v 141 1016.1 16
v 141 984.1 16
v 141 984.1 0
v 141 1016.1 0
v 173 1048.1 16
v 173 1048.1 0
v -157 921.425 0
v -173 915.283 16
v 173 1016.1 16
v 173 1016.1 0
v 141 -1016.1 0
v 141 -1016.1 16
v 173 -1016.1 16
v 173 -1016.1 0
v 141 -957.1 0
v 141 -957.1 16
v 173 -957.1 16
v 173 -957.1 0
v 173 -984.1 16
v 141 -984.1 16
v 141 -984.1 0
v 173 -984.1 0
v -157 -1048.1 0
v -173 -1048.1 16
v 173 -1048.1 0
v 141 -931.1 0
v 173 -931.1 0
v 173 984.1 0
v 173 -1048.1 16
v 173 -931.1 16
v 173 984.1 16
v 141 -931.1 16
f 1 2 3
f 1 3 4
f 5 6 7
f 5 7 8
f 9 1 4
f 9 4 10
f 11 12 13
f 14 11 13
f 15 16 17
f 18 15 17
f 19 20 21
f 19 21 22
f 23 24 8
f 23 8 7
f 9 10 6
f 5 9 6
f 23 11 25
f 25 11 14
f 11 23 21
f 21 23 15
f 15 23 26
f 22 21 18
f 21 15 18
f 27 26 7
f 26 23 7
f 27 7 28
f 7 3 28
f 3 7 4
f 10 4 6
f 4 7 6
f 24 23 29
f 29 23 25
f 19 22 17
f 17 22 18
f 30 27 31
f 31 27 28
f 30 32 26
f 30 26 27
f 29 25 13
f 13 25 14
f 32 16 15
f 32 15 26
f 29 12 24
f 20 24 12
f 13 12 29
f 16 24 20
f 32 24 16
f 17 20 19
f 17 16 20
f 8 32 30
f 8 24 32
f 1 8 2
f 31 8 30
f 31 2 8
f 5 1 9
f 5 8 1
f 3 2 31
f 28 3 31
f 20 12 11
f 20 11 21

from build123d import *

# Parameters (mm, degrees)
BOSS_EXTRUDE1_DEPTH = 16
CUT_EXTRUDE2_DEPTH  = 2104.387610499
SKETCH6_W           = 32
SKETCH6_H           = 32
SKETCH6_H_2         = 26
CUT_EXTRUDE4_DEPTH  = 1063.402282565


with BuildPart() as part:
    # Sketch1 → Boss-Extrude1 (new body)
    with BuildSketch(Plane.XY):
        Polygon((173, 1048.1), (-173, 915.283043878), (-173, -1048.1), (173, -1048.1), align=None)
    extrude(amount=BOSS_EXTRUDE1_DEPTH)

    # Sketch3 → Cut-Extrude2 (cut, through all)
    with BuildSketch(Plane.XZ.offset(1048.1)):
        Polygon((-173, 16), (-157, 0), (-173, 0), align=None)
    extrude(amount=-CUT_EXTRUDE2_DEPTH, mode=Mode.SUBTRACT)

    # Sketch6 → Cut-Extrude4 (cut, through all)
    with BuildSketch(Plane.XY.offset(16)):
        with Locations((157, 1000.1)):
            Rectangle(SKETCH6_W, SKETCH6_H)
        with Locations((157, -1000.1)):
            Rectangle(SKETCH6_W, SKETCH6_H)
        with Locations((157, -944.1)):
            Rectangle(SKETCH6_W, SKETCH6_H_2)
    extrude(amount=-CUT_EXTRUDE4_DEPTH, mode=Mode.SUBTRACT)


solid = part.part
